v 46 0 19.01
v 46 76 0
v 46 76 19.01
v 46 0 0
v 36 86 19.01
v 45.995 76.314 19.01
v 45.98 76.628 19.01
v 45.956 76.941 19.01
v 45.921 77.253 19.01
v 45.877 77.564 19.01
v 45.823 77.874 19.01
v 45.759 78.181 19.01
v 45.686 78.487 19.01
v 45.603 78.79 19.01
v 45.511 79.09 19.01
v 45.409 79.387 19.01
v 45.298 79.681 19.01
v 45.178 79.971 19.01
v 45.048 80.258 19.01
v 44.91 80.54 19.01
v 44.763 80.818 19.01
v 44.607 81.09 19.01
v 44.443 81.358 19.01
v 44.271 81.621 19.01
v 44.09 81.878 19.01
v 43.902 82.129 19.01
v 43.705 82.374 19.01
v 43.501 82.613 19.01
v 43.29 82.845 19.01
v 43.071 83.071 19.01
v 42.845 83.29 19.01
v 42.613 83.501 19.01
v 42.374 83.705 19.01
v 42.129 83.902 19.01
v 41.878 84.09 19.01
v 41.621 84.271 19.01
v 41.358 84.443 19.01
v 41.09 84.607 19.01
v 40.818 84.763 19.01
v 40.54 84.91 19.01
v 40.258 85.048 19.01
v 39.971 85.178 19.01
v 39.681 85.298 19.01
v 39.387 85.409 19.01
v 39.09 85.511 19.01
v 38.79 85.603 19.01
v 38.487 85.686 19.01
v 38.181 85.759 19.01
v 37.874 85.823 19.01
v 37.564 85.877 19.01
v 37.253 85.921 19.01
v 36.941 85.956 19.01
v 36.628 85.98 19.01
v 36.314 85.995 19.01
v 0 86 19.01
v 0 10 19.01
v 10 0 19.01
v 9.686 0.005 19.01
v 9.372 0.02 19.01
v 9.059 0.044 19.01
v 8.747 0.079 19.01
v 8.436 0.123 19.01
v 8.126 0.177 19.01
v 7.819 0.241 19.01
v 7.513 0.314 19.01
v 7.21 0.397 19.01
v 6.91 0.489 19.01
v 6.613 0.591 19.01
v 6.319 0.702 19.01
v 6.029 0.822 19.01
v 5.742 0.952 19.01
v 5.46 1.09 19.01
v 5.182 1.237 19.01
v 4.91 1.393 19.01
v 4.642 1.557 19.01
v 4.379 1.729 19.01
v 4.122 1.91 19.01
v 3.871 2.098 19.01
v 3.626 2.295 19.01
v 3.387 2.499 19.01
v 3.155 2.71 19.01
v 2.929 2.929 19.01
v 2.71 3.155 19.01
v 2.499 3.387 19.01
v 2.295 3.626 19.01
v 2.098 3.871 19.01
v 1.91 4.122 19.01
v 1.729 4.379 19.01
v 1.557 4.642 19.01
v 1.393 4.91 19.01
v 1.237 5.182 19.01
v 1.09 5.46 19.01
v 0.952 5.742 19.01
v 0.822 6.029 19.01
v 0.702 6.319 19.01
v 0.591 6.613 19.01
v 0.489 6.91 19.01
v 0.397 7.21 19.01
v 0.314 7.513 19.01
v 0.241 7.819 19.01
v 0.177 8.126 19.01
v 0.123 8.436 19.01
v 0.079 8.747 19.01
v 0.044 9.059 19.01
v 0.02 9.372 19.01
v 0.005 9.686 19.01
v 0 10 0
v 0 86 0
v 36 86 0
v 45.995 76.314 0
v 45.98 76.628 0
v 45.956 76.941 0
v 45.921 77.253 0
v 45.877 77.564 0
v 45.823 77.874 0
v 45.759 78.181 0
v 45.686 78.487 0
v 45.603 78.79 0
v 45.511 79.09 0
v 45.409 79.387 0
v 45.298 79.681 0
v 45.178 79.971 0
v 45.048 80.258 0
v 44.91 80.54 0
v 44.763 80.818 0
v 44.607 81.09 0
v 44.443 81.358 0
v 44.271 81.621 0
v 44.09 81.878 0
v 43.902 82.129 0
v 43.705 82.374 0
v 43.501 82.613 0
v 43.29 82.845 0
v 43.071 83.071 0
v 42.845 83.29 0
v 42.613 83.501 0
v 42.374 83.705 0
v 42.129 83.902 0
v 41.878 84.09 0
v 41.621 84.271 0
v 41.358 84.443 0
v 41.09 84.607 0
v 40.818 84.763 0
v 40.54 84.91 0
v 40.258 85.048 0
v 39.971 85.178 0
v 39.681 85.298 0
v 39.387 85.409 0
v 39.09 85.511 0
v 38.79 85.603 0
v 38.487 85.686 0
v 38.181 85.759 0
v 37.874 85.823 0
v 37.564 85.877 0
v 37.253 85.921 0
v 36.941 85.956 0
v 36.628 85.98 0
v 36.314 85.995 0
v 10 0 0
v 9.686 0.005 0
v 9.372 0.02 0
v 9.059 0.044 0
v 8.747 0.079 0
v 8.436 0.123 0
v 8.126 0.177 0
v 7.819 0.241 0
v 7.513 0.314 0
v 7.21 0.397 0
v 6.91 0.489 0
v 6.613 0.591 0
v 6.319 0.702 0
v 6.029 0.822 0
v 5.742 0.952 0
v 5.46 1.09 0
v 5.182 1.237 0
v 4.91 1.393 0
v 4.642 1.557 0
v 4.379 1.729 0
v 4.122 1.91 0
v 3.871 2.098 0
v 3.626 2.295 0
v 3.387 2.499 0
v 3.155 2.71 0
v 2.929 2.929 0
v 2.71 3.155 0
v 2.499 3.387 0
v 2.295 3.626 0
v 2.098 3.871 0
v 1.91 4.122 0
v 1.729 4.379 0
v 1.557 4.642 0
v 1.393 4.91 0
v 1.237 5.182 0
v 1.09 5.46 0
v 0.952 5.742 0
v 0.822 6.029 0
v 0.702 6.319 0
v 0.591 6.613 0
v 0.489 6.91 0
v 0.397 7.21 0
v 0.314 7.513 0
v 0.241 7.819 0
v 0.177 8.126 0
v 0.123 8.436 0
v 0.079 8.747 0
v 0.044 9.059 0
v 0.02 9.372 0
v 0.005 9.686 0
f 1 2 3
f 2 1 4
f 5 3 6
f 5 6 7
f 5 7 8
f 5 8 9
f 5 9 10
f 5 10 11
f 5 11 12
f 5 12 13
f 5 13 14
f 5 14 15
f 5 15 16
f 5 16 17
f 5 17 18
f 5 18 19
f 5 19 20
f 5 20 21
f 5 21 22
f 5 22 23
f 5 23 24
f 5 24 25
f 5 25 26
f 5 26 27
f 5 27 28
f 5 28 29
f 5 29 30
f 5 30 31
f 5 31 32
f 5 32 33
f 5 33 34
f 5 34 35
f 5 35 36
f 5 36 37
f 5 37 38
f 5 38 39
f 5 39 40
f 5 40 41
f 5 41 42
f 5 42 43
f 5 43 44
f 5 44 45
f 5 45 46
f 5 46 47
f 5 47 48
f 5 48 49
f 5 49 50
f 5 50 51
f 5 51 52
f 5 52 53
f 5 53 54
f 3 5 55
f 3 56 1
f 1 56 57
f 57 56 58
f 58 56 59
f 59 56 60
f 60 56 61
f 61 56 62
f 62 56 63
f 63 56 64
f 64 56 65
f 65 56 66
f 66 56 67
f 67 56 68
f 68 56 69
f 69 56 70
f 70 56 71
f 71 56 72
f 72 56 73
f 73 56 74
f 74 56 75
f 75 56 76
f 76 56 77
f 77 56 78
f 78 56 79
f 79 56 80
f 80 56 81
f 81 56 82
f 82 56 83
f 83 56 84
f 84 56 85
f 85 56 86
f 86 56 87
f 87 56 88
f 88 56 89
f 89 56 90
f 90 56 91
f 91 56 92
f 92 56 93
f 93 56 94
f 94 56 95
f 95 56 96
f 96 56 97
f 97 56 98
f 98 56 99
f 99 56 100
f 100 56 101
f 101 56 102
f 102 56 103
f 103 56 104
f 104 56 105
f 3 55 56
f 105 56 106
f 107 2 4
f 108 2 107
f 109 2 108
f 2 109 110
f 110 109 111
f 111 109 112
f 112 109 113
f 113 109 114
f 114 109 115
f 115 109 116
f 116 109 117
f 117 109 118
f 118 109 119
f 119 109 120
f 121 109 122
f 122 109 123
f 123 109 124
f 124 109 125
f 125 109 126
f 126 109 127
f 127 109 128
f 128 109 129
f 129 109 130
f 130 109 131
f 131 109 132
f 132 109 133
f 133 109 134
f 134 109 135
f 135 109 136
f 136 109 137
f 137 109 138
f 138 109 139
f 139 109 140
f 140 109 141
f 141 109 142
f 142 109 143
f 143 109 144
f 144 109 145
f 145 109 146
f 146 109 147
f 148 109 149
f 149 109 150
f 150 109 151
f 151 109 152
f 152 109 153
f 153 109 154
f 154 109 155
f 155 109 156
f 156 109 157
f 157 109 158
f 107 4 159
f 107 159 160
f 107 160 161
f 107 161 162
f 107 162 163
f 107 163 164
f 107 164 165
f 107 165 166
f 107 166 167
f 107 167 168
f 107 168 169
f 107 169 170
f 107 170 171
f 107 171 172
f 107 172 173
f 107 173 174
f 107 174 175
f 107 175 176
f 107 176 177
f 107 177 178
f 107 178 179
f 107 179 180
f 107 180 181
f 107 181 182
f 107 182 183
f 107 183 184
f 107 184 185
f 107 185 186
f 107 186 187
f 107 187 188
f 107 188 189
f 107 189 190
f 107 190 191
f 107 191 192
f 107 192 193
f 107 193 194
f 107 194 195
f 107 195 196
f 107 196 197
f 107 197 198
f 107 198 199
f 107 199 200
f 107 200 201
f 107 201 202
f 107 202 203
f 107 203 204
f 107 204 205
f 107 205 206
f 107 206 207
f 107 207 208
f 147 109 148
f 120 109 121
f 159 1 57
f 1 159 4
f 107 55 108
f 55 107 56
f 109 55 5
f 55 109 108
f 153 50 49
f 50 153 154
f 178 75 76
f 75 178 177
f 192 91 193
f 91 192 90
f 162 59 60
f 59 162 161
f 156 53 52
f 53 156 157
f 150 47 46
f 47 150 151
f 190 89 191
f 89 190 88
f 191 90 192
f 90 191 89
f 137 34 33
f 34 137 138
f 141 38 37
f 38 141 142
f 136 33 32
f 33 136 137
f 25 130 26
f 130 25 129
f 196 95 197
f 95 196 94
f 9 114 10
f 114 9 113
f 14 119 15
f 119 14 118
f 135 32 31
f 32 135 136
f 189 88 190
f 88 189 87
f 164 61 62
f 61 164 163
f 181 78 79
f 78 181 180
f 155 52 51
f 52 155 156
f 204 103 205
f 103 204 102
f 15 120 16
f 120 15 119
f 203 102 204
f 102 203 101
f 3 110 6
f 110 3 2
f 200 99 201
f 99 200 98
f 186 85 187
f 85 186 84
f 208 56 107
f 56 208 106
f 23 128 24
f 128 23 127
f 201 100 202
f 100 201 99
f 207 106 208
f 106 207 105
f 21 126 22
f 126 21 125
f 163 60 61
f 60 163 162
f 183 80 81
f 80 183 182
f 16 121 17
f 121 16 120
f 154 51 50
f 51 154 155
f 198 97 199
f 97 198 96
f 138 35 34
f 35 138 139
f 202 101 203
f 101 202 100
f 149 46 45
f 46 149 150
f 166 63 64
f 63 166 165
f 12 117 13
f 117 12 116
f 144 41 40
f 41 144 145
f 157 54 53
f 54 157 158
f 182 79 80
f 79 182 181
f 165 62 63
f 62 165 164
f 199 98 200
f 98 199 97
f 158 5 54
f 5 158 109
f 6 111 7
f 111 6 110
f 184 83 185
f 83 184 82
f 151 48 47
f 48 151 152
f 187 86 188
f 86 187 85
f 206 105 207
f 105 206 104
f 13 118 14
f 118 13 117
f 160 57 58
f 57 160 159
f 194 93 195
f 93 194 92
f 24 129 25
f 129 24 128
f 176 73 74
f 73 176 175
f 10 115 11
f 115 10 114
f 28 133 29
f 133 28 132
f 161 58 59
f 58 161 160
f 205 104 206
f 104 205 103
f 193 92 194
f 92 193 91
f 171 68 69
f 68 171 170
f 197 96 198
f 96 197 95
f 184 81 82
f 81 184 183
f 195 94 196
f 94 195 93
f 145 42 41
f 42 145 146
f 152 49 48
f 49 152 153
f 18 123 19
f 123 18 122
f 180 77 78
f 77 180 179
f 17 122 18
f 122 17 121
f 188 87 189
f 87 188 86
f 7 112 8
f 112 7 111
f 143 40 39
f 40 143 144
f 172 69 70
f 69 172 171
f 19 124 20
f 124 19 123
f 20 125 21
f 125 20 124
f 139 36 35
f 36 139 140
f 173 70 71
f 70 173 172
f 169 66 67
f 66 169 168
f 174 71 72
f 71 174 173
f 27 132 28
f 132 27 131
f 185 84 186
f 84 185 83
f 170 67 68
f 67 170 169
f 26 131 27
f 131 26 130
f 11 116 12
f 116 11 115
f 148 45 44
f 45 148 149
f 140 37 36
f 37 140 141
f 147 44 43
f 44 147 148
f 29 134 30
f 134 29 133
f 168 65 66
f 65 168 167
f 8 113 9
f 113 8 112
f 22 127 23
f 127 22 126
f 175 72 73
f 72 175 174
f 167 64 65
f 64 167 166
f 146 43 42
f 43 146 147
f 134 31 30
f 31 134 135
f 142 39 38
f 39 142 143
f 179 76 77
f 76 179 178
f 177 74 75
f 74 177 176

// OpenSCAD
$fn=200;

length = 86;
width= 46;
height = 19;
radius = 10;

translate([10, 10, 0]){ 
    roundedBox(length, width, height, radius);
}
module roundedBox(length, width, height, radius)
{
    dRadius = 2*radius;

    //cube bottom right
    translate([width-dRadius,-radius,0]) {
        cube(size=[radius,radius,height+0.01]);
    }

    //cube top left
    translate([-radius,length-dRadius,0]) {
        cube(size=[radius,radius,height+0.01]);
    }

    //base rounded shape
    minkowski() {
        cube(size=[width-dRadius,length-dRadius, height]);
        cylinder(r=radius, h=0.01);
    }
  
    
  
}
